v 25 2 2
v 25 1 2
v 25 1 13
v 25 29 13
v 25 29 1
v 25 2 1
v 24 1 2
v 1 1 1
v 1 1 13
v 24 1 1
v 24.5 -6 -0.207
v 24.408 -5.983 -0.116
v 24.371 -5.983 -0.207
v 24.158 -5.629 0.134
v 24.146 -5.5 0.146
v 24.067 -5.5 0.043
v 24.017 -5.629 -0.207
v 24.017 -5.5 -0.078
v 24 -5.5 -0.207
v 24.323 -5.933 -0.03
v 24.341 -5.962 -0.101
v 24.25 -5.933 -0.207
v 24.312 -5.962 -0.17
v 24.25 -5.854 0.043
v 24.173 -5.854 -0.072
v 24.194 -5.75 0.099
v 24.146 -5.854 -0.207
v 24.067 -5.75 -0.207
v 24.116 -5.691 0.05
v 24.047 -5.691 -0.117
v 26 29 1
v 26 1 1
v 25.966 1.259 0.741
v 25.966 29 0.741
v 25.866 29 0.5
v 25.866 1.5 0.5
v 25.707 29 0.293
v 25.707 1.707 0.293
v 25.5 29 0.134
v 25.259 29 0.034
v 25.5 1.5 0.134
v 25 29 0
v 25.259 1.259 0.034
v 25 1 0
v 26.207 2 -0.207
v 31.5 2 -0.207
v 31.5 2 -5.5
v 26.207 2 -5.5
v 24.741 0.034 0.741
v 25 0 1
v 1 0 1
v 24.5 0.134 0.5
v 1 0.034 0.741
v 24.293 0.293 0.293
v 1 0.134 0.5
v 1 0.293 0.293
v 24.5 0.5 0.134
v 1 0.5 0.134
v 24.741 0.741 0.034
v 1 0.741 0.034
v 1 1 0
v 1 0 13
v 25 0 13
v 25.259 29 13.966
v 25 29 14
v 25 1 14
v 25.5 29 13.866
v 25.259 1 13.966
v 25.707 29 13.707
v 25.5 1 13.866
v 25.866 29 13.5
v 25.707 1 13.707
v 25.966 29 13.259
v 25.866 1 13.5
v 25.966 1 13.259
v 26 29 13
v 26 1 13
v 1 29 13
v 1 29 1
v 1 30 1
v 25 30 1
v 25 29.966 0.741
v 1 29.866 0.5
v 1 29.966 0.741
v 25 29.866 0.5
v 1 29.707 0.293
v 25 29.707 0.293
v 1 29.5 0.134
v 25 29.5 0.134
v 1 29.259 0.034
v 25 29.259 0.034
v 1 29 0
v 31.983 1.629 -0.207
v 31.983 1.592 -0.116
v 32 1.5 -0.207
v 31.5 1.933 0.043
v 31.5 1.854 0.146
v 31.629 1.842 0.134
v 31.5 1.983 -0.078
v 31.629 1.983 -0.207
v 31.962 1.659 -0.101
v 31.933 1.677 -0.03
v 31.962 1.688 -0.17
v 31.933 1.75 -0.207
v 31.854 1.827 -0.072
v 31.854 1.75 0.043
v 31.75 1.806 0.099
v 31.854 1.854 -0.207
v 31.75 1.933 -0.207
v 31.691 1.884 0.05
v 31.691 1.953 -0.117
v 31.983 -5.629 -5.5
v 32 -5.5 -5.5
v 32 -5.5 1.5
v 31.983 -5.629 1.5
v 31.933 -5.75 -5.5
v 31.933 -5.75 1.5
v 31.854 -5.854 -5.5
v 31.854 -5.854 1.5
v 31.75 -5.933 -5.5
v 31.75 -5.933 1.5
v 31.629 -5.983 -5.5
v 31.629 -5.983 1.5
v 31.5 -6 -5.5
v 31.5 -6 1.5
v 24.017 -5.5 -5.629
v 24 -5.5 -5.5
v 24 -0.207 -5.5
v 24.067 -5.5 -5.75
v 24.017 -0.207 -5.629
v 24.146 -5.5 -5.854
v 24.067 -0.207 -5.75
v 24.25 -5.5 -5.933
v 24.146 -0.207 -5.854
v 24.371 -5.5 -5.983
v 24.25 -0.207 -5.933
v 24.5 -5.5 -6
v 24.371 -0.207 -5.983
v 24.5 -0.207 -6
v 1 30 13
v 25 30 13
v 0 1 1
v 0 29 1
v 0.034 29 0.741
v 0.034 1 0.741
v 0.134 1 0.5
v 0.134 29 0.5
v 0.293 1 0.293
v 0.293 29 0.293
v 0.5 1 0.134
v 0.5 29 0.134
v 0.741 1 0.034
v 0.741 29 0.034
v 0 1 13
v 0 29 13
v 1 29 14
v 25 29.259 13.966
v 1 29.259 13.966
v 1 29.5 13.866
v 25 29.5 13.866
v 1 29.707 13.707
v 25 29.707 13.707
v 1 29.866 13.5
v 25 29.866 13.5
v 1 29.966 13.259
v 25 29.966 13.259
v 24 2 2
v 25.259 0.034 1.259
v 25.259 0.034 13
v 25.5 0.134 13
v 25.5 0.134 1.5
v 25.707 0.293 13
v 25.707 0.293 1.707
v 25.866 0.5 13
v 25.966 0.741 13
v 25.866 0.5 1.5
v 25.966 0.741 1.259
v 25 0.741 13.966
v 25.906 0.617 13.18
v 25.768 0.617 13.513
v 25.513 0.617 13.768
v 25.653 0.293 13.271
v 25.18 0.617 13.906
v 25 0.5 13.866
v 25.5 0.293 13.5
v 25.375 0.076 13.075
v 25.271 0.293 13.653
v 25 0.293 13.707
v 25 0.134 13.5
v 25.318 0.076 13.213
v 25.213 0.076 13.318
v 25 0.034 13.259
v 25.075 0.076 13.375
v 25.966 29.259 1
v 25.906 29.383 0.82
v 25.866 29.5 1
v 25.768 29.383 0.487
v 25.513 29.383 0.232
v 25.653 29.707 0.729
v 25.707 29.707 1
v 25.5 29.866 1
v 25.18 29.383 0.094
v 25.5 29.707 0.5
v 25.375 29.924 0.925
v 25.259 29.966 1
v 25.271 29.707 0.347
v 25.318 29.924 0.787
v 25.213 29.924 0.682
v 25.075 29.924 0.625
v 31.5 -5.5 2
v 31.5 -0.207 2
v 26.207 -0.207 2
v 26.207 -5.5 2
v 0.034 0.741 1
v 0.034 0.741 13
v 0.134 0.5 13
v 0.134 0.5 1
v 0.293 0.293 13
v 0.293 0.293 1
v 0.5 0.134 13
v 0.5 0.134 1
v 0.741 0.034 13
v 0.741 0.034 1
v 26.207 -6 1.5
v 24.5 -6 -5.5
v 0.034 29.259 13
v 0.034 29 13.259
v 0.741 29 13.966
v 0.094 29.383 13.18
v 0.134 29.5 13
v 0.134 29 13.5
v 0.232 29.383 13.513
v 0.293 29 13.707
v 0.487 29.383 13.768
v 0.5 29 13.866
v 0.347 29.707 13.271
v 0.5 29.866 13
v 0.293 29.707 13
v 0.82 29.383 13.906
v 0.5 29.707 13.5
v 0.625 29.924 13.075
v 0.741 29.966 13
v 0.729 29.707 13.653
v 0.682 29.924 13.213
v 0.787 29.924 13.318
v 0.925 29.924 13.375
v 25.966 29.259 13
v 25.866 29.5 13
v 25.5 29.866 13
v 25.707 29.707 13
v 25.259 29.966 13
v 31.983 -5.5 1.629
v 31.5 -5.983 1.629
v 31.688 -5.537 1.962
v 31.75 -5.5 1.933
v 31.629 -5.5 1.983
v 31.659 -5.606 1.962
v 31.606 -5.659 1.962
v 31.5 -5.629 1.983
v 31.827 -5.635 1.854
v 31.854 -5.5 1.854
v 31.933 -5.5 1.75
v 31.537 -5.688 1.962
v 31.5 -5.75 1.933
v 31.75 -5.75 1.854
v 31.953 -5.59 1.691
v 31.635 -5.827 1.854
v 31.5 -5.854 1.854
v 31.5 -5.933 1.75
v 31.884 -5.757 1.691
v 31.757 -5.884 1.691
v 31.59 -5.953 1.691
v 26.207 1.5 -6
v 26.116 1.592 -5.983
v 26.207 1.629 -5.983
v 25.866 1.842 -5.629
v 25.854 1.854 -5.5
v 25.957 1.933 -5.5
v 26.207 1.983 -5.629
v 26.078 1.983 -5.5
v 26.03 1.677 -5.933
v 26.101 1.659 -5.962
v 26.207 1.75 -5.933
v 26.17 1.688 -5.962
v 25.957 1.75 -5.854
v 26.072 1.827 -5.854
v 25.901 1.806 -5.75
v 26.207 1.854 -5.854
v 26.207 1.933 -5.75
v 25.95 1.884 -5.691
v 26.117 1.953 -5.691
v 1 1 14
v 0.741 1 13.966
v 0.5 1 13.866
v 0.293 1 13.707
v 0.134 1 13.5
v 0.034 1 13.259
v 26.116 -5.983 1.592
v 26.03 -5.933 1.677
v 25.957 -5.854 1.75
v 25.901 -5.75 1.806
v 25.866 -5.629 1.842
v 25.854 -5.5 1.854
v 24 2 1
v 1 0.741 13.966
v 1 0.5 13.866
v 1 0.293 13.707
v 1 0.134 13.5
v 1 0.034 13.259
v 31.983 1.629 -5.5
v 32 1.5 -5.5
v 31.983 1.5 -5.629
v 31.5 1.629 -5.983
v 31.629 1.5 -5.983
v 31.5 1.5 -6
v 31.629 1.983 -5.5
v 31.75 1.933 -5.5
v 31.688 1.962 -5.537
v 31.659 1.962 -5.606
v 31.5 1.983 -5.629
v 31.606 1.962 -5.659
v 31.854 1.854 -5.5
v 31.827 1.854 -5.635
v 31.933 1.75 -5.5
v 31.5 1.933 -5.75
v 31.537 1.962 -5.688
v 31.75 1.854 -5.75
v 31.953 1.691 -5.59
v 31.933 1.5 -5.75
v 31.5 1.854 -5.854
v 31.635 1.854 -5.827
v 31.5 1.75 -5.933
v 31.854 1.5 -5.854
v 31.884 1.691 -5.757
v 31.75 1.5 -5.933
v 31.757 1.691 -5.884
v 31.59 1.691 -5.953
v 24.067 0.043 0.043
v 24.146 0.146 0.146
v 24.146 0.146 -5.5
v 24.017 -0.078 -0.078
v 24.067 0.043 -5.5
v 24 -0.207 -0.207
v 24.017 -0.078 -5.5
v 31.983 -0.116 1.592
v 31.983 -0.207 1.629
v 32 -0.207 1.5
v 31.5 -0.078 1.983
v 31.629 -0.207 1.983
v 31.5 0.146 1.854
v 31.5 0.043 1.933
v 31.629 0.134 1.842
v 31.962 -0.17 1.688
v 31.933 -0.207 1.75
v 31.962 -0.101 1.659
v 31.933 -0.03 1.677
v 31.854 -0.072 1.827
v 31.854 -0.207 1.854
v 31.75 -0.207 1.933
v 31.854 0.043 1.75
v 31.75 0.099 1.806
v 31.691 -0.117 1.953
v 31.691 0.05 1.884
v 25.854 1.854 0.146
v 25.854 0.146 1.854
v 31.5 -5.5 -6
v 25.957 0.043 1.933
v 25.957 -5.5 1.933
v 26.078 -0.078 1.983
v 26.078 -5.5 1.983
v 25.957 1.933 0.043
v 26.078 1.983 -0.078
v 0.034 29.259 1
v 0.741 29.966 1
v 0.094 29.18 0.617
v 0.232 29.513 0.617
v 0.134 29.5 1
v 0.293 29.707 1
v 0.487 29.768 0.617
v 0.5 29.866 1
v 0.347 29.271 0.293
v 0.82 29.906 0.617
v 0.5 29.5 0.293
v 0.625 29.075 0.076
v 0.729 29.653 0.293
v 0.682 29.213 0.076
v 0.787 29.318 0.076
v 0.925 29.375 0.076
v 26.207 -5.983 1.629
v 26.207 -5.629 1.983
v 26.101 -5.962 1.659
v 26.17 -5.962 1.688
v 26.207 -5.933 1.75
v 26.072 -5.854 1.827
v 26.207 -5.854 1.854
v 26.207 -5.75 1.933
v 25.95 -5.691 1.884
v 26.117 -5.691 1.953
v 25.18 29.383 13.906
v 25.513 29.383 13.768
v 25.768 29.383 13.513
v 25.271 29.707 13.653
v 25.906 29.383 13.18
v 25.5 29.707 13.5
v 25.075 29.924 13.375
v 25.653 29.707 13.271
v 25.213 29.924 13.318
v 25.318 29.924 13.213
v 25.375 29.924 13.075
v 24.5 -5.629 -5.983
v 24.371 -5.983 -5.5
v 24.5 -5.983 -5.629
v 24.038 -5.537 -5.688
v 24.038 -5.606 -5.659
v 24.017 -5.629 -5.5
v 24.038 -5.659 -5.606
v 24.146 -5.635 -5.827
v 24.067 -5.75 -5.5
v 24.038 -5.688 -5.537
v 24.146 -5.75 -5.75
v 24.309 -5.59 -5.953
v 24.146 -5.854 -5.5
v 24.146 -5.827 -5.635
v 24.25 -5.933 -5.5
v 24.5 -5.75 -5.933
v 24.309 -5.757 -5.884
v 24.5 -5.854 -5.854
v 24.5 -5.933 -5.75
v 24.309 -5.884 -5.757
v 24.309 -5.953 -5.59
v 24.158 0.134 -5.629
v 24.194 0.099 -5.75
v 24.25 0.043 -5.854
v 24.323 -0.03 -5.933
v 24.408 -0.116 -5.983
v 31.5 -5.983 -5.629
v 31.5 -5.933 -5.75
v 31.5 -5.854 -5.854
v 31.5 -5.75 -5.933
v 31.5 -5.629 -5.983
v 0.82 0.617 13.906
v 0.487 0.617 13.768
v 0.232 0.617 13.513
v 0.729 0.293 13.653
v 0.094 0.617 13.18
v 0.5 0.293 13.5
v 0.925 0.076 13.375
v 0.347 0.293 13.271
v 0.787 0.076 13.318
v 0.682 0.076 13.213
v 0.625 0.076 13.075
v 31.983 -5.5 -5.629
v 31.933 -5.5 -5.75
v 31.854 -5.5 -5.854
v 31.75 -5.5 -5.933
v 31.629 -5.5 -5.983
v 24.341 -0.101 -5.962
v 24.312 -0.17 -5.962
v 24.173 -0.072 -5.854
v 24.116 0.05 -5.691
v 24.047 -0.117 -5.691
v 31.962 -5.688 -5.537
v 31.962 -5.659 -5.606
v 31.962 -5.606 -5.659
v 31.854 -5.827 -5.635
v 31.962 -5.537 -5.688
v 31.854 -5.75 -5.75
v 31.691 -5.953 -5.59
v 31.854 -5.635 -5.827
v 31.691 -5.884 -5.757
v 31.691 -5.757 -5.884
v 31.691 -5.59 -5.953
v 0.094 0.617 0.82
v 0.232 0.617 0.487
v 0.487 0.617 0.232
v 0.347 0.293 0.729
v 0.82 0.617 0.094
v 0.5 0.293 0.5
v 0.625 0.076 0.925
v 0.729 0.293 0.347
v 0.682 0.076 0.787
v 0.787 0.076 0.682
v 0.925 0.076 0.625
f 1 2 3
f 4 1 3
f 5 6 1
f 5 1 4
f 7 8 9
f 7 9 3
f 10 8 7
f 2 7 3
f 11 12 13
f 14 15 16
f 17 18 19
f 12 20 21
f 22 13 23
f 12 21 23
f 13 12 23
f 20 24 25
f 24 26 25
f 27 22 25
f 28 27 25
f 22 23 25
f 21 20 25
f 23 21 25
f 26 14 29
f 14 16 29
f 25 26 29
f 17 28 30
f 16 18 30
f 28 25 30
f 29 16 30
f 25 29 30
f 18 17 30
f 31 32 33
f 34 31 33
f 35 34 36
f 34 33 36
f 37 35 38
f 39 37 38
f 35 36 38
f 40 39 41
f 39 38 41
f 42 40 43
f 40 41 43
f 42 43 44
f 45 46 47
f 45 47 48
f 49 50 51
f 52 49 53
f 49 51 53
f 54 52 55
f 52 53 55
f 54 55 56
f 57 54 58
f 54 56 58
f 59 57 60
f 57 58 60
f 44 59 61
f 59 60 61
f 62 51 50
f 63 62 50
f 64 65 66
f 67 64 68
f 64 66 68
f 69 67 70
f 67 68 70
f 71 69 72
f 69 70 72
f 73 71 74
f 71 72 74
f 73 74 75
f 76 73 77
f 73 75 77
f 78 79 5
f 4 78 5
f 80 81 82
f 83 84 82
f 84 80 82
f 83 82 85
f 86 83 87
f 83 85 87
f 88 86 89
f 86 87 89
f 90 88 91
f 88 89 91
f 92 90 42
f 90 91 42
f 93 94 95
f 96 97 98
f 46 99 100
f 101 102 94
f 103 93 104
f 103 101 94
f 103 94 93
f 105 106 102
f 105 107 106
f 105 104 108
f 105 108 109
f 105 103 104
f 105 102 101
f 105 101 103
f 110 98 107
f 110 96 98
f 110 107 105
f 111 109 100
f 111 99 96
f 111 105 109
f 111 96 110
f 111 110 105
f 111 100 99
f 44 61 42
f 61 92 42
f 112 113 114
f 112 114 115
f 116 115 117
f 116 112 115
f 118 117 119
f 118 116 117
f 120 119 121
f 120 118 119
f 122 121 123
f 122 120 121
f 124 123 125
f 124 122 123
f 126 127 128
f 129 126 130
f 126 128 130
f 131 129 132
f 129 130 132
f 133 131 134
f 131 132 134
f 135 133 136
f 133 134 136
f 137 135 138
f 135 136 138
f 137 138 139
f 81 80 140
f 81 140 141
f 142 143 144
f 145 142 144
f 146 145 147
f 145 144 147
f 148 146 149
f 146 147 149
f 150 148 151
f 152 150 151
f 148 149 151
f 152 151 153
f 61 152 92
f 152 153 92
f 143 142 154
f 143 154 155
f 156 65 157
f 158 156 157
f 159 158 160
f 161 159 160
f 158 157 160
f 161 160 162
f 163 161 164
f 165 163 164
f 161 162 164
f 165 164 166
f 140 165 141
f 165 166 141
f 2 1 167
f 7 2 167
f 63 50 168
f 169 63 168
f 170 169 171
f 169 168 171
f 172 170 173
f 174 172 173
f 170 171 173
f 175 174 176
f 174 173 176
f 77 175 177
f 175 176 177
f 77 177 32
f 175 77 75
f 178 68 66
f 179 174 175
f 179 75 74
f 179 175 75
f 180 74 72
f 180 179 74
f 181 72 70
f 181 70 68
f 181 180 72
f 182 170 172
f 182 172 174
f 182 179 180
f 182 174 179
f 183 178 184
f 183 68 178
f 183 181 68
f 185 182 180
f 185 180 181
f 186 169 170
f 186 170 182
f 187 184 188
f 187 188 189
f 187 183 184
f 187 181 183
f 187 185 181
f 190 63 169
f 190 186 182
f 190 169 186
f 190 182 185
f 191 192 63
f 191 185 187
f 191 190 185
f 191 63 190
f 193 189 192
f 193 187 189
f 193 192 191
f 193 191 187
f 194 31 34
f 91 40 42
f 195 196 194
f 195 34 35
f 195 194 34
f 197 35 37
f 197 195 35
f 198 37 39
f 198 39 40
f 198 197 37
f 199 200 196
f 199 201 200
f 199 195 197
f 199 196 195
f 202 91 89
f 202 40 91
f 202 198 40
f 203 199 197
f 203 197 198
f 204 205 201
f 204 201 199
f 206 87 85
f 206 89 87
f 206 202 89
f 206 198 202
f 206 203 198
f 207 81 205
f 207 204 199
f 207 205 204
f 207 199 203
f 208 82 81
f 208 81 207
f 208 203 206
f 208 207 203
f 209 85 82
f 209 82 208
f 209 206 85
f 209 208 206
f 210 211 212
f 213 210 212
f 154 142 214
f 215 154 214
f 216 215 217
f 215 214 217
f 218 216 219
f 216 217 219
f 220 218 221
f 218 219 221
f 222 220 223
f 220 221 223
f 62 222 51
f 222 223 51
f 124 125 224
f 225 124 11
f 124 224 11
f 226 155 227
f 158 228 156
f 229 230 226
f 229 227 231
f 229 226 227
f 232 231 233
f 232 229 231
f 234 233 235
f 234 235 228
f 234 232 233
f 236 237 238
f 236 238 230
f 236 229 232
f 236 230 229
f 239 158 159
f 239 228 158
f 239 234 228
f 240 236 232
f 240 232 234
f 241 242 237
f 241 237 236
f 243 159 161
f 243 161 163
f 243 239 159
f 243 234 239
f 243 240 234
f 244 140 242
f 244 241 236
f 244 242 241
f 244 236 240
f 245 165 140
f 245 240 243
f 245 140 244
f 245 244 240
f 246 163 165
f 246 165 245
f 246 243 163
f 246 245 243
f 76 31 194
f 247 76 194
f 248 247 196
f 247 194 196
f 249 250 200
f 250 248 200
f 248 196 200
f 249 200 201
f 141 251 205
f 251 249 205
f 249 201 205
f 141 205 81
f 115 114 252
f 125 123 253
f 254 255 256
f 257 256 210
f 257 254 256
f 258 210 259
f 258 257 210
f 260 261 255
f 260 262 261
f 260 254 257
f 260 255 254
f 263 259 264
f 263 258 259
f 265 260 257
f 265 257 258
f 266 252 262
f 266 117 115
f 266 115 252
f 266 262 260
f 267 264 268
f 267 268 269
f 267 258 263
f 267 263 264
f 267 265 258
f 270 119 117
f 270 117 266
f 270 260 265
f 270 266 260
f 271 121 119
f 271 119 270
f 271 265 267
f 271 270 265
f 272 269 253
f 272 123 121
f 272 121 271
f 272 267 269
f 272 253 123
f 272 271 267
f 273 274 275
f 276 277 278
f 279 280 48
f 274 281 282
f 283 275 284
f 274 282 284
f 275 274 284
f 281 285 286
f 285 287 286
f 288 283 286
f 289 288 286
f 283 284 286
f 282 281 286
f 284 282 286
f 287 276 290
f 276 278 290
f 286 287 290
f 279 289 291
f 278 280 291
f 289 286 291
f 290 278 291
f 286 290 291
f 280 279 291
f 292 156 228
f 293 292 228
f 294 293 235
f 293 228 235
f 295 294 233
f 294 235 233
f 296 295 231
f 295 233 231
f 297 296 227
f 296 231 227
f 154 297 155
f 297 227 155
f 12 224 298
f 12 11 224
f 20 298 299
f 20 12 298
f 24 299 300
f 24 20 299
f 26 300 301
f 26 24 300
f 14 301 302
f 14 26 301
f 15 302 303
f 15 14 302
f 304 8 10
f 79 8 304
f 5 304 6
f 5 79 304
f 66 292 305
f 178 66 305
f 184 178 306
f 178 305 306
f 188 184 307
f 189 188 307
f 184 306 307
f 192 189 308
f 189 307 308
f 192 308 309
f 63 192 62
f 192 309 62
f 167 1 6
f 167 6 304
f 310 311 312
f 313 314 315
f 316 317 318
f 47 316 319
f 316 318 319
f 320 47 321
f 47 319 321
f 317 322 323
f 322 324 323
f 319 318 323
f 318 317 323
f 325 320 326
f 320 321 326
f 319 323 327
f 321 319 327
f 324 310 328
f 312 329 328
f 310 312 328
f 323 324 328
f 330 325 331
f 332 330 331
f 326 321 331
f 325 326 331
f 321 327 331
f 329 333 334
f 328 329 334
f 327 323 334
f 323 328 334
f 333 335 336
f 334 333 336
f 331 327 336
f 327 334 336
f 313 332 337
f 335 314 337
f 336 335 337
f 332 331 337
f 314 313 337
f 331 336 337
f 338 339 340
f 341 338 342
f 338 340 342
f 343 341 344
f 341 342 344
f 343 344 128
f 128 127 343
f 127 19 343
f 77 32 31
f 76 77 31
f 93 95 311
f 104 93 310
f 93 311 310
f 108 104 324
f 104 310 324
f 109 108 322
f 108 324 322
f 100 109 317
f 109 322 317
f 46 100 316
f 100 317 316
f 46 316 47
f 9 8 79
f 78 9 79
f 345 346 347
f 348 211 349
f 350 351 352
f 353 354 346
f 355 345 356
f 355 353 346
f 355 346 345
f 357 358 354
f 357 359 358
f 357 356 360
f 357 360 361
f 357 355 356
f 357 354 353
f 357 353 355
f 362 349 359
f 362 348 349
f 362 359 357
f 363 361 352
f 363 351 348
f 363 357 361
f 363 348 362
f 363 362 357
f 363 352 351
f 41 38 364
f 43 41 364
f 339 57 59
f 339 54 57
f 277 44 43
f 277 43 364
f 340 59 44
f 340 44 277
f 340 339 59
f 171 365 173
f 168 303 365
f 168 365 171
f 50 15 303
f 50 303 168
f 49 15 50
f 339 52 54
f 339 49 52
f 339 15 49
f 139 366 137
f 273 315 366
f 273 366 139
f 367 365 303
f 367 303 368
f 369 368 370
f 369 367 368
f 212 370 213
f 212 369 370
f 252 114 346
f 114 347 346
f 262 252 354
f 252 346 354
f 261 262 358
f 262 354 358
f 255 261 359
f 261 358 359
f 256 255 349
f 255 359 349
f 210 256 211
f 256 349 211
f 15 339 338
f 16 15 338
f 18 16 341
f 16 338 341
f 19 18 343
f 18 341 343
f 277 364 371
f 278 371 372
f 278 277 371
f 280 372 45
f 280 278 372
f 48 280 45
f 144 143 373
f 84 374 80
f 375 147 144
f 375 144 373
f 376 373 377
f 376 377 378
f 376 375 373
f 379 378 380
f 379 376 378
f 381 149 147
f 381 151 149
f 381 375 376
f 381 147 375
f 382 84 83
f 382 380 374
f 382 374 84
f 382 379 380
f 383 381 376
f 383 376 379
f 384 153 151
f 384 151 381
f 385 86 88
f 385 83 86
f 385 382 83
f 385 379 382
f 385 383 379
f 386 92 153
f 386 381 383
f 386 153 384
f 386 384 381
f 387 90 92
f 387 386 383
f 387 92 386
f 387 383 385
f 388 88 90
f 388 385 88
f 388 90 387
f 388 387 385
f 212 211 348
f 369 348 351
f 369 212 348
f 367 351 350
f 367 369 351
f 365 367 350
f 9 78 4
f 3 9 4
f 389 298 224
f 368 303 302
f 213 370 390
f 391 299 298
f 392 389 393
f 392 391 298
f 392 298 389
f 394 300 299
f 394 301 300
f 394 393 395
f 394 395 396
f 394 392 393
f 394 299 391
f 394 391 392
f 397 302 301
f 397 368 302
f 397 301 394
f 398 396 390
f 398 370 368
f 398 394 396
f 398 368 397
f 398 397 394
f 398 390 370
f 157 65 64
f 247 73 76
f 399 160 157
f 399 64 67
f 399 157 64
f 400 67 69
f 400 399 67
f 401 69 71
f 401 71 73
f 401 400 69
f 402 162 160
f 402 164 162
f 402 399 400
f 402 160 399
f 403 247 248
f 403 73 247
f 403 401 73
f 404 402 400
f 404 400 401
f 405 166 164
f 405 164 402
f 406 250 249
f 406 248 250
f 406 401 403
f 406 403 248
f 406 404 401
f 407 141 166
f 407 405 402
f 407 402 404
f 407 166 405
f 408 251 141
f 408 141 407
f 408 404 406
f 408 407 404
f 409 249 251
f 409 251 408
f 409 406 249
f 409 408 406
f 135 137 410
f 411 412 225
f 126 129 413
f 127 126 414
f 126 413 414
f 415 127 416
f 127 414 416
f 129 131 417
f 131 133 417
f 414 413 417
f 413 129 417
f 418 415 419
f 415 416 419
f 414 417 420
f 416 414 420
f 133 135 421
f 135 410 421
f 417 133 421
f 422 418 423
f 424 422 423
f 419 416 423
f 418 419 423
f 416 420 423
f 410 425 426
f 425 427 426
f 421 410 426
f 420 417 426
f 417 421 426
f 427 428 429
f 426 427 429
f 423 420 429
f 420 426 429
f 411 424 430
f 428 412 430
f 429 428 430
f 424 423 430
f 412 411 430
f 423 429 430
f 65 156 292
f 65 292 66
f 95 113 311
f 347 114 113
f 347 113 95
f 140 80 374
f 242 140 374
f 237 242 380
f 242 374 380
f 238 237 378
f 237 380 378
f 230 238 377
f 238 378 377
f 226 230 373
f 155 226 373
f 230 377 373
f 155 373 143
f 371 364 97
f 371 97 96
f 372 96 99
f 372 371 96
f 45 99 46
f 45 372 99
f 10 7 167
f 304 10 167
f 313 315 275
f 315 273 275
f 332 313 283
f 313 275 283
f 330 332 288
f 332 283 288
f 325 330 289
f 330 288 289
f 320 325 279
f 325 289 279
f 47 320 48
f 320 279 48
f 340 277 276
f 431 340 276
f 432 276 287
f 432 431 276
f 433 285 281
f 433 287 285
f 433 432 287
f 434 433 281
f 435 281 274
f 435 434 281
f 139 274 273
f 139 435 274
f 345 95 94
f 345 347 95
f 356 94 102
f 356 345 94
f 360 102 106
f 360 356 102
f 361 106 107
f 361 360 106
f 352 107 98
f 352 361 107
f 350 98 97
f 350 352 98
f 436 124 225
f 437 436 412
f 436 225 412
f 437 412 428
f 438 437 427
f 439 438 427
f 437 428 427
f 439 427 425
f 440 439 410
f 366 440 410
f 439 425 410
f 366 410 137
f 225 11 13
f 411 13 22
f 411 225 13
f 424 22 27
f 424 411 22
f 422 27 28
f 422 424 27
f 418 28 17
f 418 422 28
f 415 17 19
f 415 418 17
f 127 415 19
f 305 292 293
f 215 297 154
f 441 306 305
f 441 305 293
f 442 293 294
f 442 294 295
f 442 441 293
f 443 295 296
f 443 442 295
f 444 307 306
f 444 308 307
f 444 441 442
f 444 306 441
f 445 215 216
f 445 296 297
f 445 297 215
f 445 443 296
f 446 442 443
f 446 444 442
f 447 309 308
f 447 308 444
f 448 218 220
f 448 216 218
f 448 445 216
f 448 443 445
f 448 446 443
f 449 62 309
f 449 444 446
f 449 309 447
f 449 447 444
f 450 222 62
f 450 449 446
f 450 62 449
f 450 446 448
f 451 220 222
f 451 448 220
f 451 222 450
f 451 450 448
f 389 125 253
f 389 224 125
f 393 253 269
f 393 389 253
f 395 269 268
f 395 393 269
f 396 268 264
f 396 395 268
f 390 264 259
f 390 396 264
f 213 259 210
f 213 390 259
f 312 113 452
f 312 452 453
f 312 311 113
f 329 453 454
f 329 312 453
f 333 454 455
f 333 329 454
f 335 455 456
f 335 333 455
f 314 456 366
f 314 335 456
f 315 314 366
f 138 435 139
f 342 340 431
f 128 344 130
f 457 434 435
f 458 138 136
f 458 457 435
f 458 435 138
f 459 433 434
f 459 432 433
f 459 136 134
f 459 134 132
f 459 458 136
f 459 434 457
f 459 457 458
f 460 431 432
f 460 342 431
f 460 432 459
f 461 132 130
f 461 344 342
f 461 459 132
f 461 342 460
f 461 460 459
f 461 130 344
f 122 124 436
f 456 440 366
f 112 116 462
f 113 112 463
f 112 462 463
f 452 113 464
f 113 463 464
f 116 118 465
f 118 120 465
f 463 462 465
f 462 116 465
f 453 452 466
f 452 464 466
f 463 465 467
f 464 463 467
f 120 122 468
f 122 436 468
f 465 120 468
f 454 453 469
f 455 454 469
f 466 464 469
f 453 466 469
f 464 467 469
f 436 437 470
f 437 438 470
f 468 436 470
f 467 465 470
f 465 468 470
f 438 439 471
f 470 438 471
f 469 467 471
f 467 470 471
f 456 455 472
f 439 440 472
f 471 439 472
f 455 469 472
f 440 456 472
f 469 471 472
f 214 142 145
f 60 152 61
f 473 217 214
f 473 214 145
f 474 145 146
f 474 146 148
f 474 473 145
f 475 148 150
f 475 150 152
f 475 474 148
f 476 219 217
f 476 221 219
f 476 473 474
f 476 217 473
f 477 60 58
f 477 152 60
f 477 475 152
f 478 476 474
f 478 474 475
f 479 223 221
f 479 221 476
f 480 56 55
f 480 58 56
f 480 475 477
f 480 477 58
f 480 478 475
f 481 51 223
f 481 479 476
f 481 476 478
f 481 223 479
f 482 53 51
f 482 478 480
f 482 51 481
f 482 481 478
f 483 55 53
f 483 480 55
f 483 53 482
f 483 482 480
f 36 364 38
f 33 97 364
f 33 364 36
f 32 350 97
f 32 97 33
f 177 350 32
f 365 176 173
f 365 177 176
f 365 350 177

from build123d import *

# Parameters (mm, degrees)
SKETCH1_W                = 26
SKETCH1_H                = 30
BOSS_EXTRUDE1_DEPTH      = 14
SHELL1_T                 = 1
BOSS_EXTRUDE3_DEPTH      = 6
BOSS_EXTRUDE3_DEPTH_BACK = 2
SKETCH2_W                = 8
SKETCH2_H                = 8
CHAMFER2_SIZE            = 2
FILLET1_R                = 1
FILLET2_R                = 0.5


with BuildPart() as part:
    # Sketch1 → Boss-Extrude1 (new body)
    with BuildSketch(Plane.XY):
        with Locations((13, 15)):
            Rectangle(SKETCH1_W, SKETCH1_H)
    extrude(amount=BOSS_EXTRUDE1_DEPTH)

    # Shell1 (no face opened: a closed hollow body)
    add(offset(amount=-SHELL1_T, mode=Mode.PRIVATE), mode=Mode.SUBTRACT)

    # Sketch2 → Boss-Extrude3 (add, two sides: drawn at the far end of the back side and taken through both)
    with BuildSketch(Plane(origin=(0, 0, 0), x_dir=(-1, 0, 0), z_dir=(0, 0, -1)).offset(-BOSS_EXTRUDE3_DEPTH_BACK)):
        with Locations((-28, -2)):
            Rectangle(SKETCH2_W, SKETCH2_H)
    extrude(amount=BOSS_EXTRUDE3_DEPTH + BOSS_EXTRUDE3_DEPTH_BACK)

    # Chamfer2
    chamfer2_edges = [part.edges().sort_by_distance(p)[0] for p in [
        (24, -3, 2),
        (24, 2, -3),
        (29, 2, 2),
    ]]
    chamfer(chamfer2_edges, length=CHAMFER2_SIZE)

    # Fillet1
    # the kernel refuses this fillet: 1 mm, written as the material it takes off along each edge
    with BuildSketch(Plane(origin=(1, 29, 1), x_dir=(0, 1, 0), z_dir=(0, 0, -1))) as fillet1_piece_1_section:
        Polygon((0, 0), (FILLET1_R, 0), (FILLET1_R, -FILLET1_R), (0, -FILLET1_R), align=None)
    fillet1_piece_1 = extrude(amount=FILLET1_R, mode=Mode.PRIVATE)
    fillet1_piece_1 = fillet1_piece_1 - Plane(origin=(1, 29, 1), x_dir=(0.7071067811865476, -0.7071067811865475, 0), z_dir=(0, 0, -1)) * Sphere(FILLET1_R, mode=Mode.PRIVATE)
    add(fillet1_piece_1, mode=Mode.SUBTRACT)
    with BuildSketch(Plane(origin=(1, 1, 1), x_dir=(0, 0, -1), z_dir=(0, -1, 0))) as fillet1_piece_2_section:
        Polygon((0, 0), (FILLET1_R, 0), (FILLET1_R, -FILLET1_R), (0, -FILLET1_R), align=None)
    fillet1_piece_2 = extrude(amount=FILLET1_R, mode=Mode.PRIVATE)
    fillet1_piece_2 = fillet1_piece_2 - Plane(origin=(1, 1, 1), x_dir=(0.7071067811865475, 0, 0.7071067811865475), z_dir=(0, -1, 0)) * Sphere(FILLET1_R, mode=Mode.PRIVATE)
    add(fillet1_piece_2, mode=Mode.SUBTRACT)
    with BuildSketch(Plane(origin=(25, 29, 1), x_dir=(0, 0, -1), z_dir=(0, 1, 0))) as fillet1_piece_3_section:
        Polygon((0, 0), (FILLET1_R, 0), (FILLET1_R, -FILLET1_R), (0, -FILLET1_R), align=None)
    fillet1_piece_3 = extrude(amount=FILLET1_R, mode=Mode.PRIVATE)
    fillet1_piece_3 = fillet1_piece_3 - Plane(origin=(25, 29, 1), x_dir=(-0.7071067811865475, 0, 0.7071067811865475), z_dir=(0, 1, 0)) * Sphere(FILLET1_R, mode=Mode.PRIVATE)
    add(fillet1_piece_3, mode=Mode.SUBTRACT)
    with BuildSketch(Plane(origin=(1, 1, 13), x_dir=(-1, 0, 0), z_dir=(0, -1, 0))) as fillet1_piece_4_section:
        Polygon((0, 0), (FILLET1_R, 0), (FILLET1_R, -FILLET1_R), (0, -FILLET1_R), align=None)
    fillet1_piece_4 = extrude(amount=FILLET1_R, mode=Mode.PRIVATE)
    fillet1_piece_4 = fillet1_piece_4 - Plane(origin=(1, 1, 13), x_dir=(0.7071067811865475, 0, -0.7071067811865475), z_dir=(0, -1, 0)) * Sphere(FILLET1_R, mode=Mode.PRIVATE)
    add(fillet1_piece_4, mode=Mode.SUBTRACT)
    with BuildSketch(Plane(origin=(25, 1, 13), x_dir=(1, 0, 0), z_dir=(0, -1, 0))) as fillet1_piece_5_section:
        Polygon((0, 0), (FILLET1_R, 0), (FILLET1_R, FILLET1_R), (0, FILLET1_R), align=None)
    fillet1_piece_5 = extrude(amount=FILLET1_R, mode=Mode.PRIVATE)
    fillet1_piece_5 = fillet1_piece_5 - Plane(origin=(25, 1, 13), x_dir=(-0.7071067811865475, 0, -0.7071067811865475), z_dir=(0, -1, 0)) * Sphere(FILLET1_R, mode=Mode.PRIVATE)
    add(fillet1_piece_5, mode=Mode.SUBTRACT)
    with BuildSketch(Plane(origin=(25, 29, 13), x_dir=(1, 0, 0), z_dir=(0, 1, 0))) as fillet1_piece_6_section:
        Polygon((0, 0), (FILLET1_R, 0), (FILLET1_R, -FILLET1_R), (0, -FILLET1_R), align=None)
    fillet1_piece_6 = extrude(amount=FILLET1_R, mode=Mode.PRIVATE)
    fillet1_piece_6 = fillet1_piece_6 - Plane(origin=(25, 29, 13), x_dir=(-0.7071067811865475, 0, -0.7071067811865475), z_dir=(0, 1, 0)) * Sphere(FILLET1_R, mode=Mode.PRIVATE)
    add(fillet1_piece_6, mode=Mode.SUBTRACT)
    with BuildSketch(Plane(origin=(1, 29, 13), x_dir=(-1, 0, 0), z_dir=(0, 1, 0))) as fillet1_piece_7_section:
        Polygon((0, 0), (FILLET1_R, 0), (FILLET1_R, FILLET1_R), (0, FILLET1_R), align=None)
    fillet1_piece_7 = extrude(amount=FILLET1_R, mode=Mode.PRIVATE)
    fillet1_piece_7 = fillet1_piece_7 - Plane(origin=(1, 29, 13), x_dir=(0.7071067811865475, 0, -0.7071067811865475), z_dir=(0, 1, 0)) * Sphere(FILLET1_R, mode=Mode.PRIVATE)
    add(fillet1_piece_7, mode=Mode.SUBTRACT)
    with BuildSketch(Plane(origin=(0, 29, 0), x_dir=(1, 0, 0), z_dir=(0, -1, 0)), Plane(origin=(26, 1, 14), x_dir=(0, 0, -1), z_dir=(0, 1, 0)), Plane(origin=(0, 29, 14), x_dir=(0, 0, -1), z_dir=(0, -1, 0))) as fillet1_piece_8:
        with BuildLine():
            CenterArc((FILLET1_R, FILLET1_R), FILLET1_R, 180, 90)
            Line((0, FILLET1_R), (0, 0))
            Line((0, 0), (FILLET1_R, 0))
        make_face()
    extrude(amount=28, mode=Mode.SUBTRACT)
    with BuildSketch(Plane(origin=(1, 0, 0), x_dir=(0, 0, 1), z_dir=(1, 0, 0))) as fillet1_piece_9_section:
        with BuildLine():
            CenterArc((FILLET1_R, -FILLET1_R), FILLET1_R, 90, 90)
            Line((0, -FILLET1_R), (0, 0))
            Line((0, 0), (FILLET1_R, 0))
        make_face()
    fillet1_piece_9 = extrude(amount=25.5, mode=Mode.PRIVATE)
    fillet1_piece_9 = split(fillet1_piece_9, bisect_by=Plane(origin=(18.381826638, 0.226414546, -5.618173362), z_dir=(-0.7071067811865476, 0, 0.7071067811865476)), keep=Keep.TOP, mode=Mode.PRIVATE)
    fillet1_piece_9 = split(fillet1_piece_9, bisect_by=Plane(origin=(18.381826638, -5.618173362, 0.226414546), z_dir=(-0.7071067811865476, 0.7071067811865476, 0)), keep=Keep.TOP, mode=Mode.PRIVATE)
    add(fillet1_piece_9, mode=Mode.SUBTRACT)
    with BuildSketch(Plane(origin=(1, 0, 0), x_dir=(0, 0, 1), z_dir=(1, 0, 0))) as fillet1_piece_10_section:
        with BuildLine():
            CenterArc((FILLET1_R, -FILLET1_R), FILLET1_R, 90, 90)
            Line((0, -FILLET1_R), (0, 0))
            Line((0, 0), (FILLET1_R, 0))
        make_face()
    fillet1_piece_10 = extrude(amount=25.5, mode=Mode.PRIVATE)
    fillet1_piece_10 = split(fillet1_piece_10, bisect_by=Plane(origin=(24.16446835, 0.528927527, 0.16446835), z_dir=(0.7071067811865476, 0, -0.7071067811865476)), keep=Keep.TOP, mode=Mode.PRIVATE)
    fillet1_piece_10 = split(fillet1_piece_10, bisect_by=Plane(origin=(24.407441135, 0.407441135, 0.042981958), z_dir=(-0.7071067811865476, 0.7071067811865476, 0)), keep=Keep.TOP, mode=Mode.PRIVATE)
    add(fillet1_piece_10, mode=Mode.SUBTRACT)
    with BuildSketch(Plane(origin=(1, 0, 0), x_dir=(0, 0, 1), z_dir=(1, 0, 0))) as fillet1_piece_11_section:
        with BuildLine():
            CenterArc((FILLET1_R, -FILLET1_R), FILLET1_R, 90, 90)
            Line((0, -FILLET1_R), (0, 0))
            Line((0, 0), (FILLET1_R, 0))
        make_face()
    fillet1_piece_11 = extrude(amount=25.5, mode=Mode.PRIVATE)
    fillet1_piece_11 = split(fillet1_piece_11, bisect_by=Plane(origin=(24.407441135, 0.042981958, 0.407441135), z_dir=(-0.7071067811865476, 0, 0.7071067811865476)), keep=Keep.TOP, mode=Mode.PRIVATE)
    fillet1_piece_11 = split(fillet1_piece_11, bisect_by=Plane(origin=(24.16446835, 0.16446835, 0.528927527), z_dir=(0.7071067811865476, -0.7071067811865476, 0)), keep=Keep.TOP, mode=Mode.PRIVATE)
    add(fillet1_piece_11, mode=Mode.SUBTRACT)
    with BuildSketch(Plane(origin=(26, -0.5, 0), x_dir=(-1, 0, 0), z_dir=(0, 1, 0))) as fillet1_piece_12_section:
        with BuildLine():
            CenterArc((FILLET1_R, FILLET1_R), FILLET1_R, 180, 90)
            Line((0, FILLET1_R), (0, 0))
            Line((0, 0), (FILLET1_R, 0))
        make_face()
    fillet1_piece_12 = extrude(amount=29.5, mode=Mode.PRIVATE)
    fillet1_piece_12 = split(fillet1_piece_12, bisect_by=Plane(origin=(25.83553165, 1.83553165, 0.528927527), z_dir=(0.7071067811865476, -0.7071067811865476, 0)), keep=Keep.TOP, mode=Mode.PRIVATE)
    fillet1_piece_12 = split(fillet1_piece_12, bisect_by=Plane(origin=(25.957018042, 1.592558865, 0.407441135), z_dir=(0, 0.7071067811865476, 0.7071067811865476)), keep=Keep.TOP, mode=Mode.PRIVATE)
    add(fillet1_piece_12, mode=Mode.SUBTRACT)
    with BuildSketch(Plane(origin=(26, -0.5, 0), x_dir=(-1, 0, 0), z_dir=(0, 1, 0))) as fillet1_piece_13_section:
        with BuildLine():
            CenterArc((FILLET1_R, FILLET1_R), FILLET1_R, 180, 90)
            Line((0, FILLET1_R), (0, 0))
            Line((0, 0), (FILLET1_R, 0))
        make_face()
    fillet1_piece_13 = extrude(amount=29.5, mode=Mode.PRIVATE)
    fillet1_piece_13 = split(fillet1_piece_13, bisect_by=Plane(origin=(25.592558865, 1.592558865, 0.042981958), z_dir=(-0.7071067811865476, 0.7071067811865476, 0)), keep=Keep.TOP, mode=Mode.PRIVATE)
    fillet1_piece_13 = split(fillet1_piece_13, bisect_by=Plane(origin=(25.471072473, 1.83553165, 0.16446835), z_dir=(0, -0.7071067811865476, -0.7071067811865476)), keep=Keep.TOP, mode=Mode.PRIVATE)
    add(fillet1_piece_13, mode=Mode.SUBTRACT)
    with BuildSketch(Plane(origin=(26, -0.5, 0), x_dir=(-1, 0, 0), z_dir=(0, 1, 0))) as fillet1_piece_14_section:
        with BuildLine():
            CenterArc((FILLET1_R, FILLET1_R), FILLET1_R, 180, 90)
            Line((0, FILLET1_R), (0, 0))
            Line((0, 0), (FILLET1_R, 0))
        make_face()
    fillet1_piece_14 = extrude(amount=29.5, mode=Mode.PRIVATE)
    fillet1_piece_14 = split(fillet1_piece_14, bisect_by=Plane(origin=(32.618183131, 8.618183131, 0.226411675), z_dir=(-0.7071067811865476, 0.7071067811865476, 0)), keep=Keep.TOP, mode=Mode.PRIVATE)
    fillet1_piece_14 = split(fillet1_piece_14, bisect_by=Plane(origin=(25.773588325, 8.618183131, -6.618183131), z_dir=(0, 0.7071067811865476, 0.7071067811865476)), keep=Keep.TOP, mode=Mode.PRIVATE)
    add(fillet1_piece_14, mode=Mode.SUBTRACT)
    with BuildSketch(Plane(origin=(25, 30, 0), x_dir=(0, -1, 0), z_dir=(-1, 0, 0)), Plane(origin=(1, 0, 14), x_dir=(0, 0, -1), z_dir=(1, 0, 0))) as fillet1_piece_15:
        with BuildLine():
            CenterArc((FILLET1_R, FILLET1_R), FILLET1_R, 180, 90)
            Line((0, FILLET1_R), (0, 0))
            Line((0, 0), (FILLET1_R, 0))
        make_face()
    extrude(amount=24, mode=Mode.SUBTRACT)
    with BuildSketch(Plane(origin=(25, 30, 14), x_dir=(0, -1, 0), z_dir=(-1, 0, 0))) as fillet1_piece_16:
        with BuildLine():
            CenterArc((FILLET1_R, -FILLET1_R), FILLET1_R, 90, 90)
            Line((0, -FILLET1_R), (0, 0))
            Line((0, 0), (FILLET1_R, 0))
        make_face()
    extrude(amount=24, mode=Mode.SUBTRACT)
    with BuildSketch(Plane(origin=(0, 30, 1), x_dir=(0, -1, 0), z_dir=(0, 0, 1)), Plane(origin=(0, 0, 1), x_dir=(1, 0, 0), z_dir=(0, 0, 1))) as fillet1_piece_17:
        with BuildLine():
            CenterArc((FILLET1_R, FILLET1_R), FILLET1_R, 180, 90)
            Line((0, FILLET1_R), (0, 0))
            Line((0, 0), (FILLET1_R, 0))
        make_face()
    extrude(amount=12, mode=Mode.SUBTRACT)
    with BuildSketch(Plane(origin=(26, 30, 1), x_dir=(0, -1, 0), z_dir=(0, 0, 1))) as fillet1_piece_18:
        with BuildLine():
            CenterArc((FILLET1_R, -FILLET1_R), FILLET1_R, 90, 90)
            Line((0, -FILLET1_R), (0, 0))
            Line((0, 0), (FILLET1_R, 0))
        make_face()
    extrude(amount=12, mode=Mode.SUBTRACT)
    with BuildSketch(Plane(origin=(26, 0, -0.5), x_dir=(-1, 0, 0), z_dir=(0, 0, 1))) as fillet1_piece_19_section:
        with BuildLine():
            CenterArc((FILLET1_R, -FILLET1_R), FILLET1_R, 90, 90)
            Line((0, -FILLET1_R), (0, 0))
            Line((0, 0), (FILLET1_R, 0))
        make_face()
    fillet1_piece_19 = extrude(amount=13.5, mode=Mode.PRIVATE)
    fillet1_piece_19 = split(fillet1_piece_19, bisect_by=Plane(origin=(25.83553165, 0.528927527, 1.83553165), z_dir=(0.7071067811865476, 0, -0.7071067811865476)), keep=Keep.TOP, mode=Mode.PRIVATE)
    fillet1_piece_19 = split(fillet1_piece_19, bisect_by=Plane(origin=(25.957018042, 0.407441135, 1.592558865), z_dir=(0, 0.7071067811865476, 0.7071067811865476)), keep=Keep.TOP, mode=Mode.PRIVATE)
    add(fillet1_piece_19, mode=Mode.SUBTRACT)
    with BuildSketch(Plane(origin=(26, 0, -0.5), x_dir=(-1, 0, 0), z_dir=(0, 0, 1))) as fillet1_piece_20_section:
        with BuildLine():
            CenterArc((FILLET1_R, -FILLET1_R), FILLET1_R, 90, 90)
            Line((0, -FILLET1_R), (0, 0))
            Line((0, 0), (FILLET1_R, 0))
        make_face()
    fillet1_piece_20 = extrude(amount=13.5, mode=Mode.PRIVATE)
    fillet1_piece_20 = split(fillet1_piece_20, bisect_by=Plane(origin=(25.592558865, 0.042981958, 1.592558865), z_dir=(-0.7071067811865476, 0, 0.7071067811865476)), keep=Keep.TOP, mode=Mode.PRIVATE)
    fillet1_piece_20 = split(fillet1_piece_20, bisect_by=Plane(origin=(25.471072473, 0.16446835, 1.83553165), z_dir=(0, -0.7071067811865476, -0.7071067811865476)), keep=Keep.TOP, mode=Mode.PRIVATE)
    add(fillet1_piece_20, mode=Mode.SUBTRACT)
    with BuildSketch(Plane(origin=(26, 0, -0.5), x_dir=(-1, 0, 0), z_dir=(0, 0, 1))) as fillet1_piece_21_section:
        with BuildLine():
            CenterArc((FILLET1_R, -FILLET1_R), FILLET1_R, 90, 90)
            Line((0, -FILLET1_R), (0, 0))
            Line((0, 0), (FILLET1_R, 0))
        make_face()
    fillet1_piece_21 = extrude(amount=13.5, mode=Mode.PRIVATE)
    fillet1_piece_21 = split(fillet1_piece_21, bisect_by=Plane(origin=(28.618101716, 0.226435602, 4.618101716), z_dir=(-0.7071067811865476, 0, 0.7071067811865476)), keep=Keep.TOP, mode=Mode.PRIVATE)
    fillet1_piece_21 = split(fillet1_piece_21, bisect_by=Plane(origin=(25.773564398, -2.618101716, 4.618101716), z_dir=(0, 0.7071067811865476, 0.7071067811865476)), keep=Keep.TOP, mode=Mode.PRIVATE)
    add(fillet1_piece_21, mode=Mode.SUBTRACT)

    # Fillet2
    fillet2_edges = [part.edges().sort_by_distance(p)[0] for p in [
        (28, -6, -6),
        (32, -6, -2),
        (32, -2, -6),
        (32, 2, -3),
        (29, 2, -6),
        (26, 2, -3),
        (29, 2, 0),
        (32, -3, 2),
        (32, 1, 1),
        (29, -6, 2),
        (26, -3, 2),
        (29, 0, 2),
        (24, -3, -6),
        (24, -6, -3),
        (24, -3, 0),
        (24, 0, -3),
        (25, 1, -6),
        (25, -6, 1),
    ]]
    fillet(fillet2_edges, radius=FILLET2_R)


solid = part.part
